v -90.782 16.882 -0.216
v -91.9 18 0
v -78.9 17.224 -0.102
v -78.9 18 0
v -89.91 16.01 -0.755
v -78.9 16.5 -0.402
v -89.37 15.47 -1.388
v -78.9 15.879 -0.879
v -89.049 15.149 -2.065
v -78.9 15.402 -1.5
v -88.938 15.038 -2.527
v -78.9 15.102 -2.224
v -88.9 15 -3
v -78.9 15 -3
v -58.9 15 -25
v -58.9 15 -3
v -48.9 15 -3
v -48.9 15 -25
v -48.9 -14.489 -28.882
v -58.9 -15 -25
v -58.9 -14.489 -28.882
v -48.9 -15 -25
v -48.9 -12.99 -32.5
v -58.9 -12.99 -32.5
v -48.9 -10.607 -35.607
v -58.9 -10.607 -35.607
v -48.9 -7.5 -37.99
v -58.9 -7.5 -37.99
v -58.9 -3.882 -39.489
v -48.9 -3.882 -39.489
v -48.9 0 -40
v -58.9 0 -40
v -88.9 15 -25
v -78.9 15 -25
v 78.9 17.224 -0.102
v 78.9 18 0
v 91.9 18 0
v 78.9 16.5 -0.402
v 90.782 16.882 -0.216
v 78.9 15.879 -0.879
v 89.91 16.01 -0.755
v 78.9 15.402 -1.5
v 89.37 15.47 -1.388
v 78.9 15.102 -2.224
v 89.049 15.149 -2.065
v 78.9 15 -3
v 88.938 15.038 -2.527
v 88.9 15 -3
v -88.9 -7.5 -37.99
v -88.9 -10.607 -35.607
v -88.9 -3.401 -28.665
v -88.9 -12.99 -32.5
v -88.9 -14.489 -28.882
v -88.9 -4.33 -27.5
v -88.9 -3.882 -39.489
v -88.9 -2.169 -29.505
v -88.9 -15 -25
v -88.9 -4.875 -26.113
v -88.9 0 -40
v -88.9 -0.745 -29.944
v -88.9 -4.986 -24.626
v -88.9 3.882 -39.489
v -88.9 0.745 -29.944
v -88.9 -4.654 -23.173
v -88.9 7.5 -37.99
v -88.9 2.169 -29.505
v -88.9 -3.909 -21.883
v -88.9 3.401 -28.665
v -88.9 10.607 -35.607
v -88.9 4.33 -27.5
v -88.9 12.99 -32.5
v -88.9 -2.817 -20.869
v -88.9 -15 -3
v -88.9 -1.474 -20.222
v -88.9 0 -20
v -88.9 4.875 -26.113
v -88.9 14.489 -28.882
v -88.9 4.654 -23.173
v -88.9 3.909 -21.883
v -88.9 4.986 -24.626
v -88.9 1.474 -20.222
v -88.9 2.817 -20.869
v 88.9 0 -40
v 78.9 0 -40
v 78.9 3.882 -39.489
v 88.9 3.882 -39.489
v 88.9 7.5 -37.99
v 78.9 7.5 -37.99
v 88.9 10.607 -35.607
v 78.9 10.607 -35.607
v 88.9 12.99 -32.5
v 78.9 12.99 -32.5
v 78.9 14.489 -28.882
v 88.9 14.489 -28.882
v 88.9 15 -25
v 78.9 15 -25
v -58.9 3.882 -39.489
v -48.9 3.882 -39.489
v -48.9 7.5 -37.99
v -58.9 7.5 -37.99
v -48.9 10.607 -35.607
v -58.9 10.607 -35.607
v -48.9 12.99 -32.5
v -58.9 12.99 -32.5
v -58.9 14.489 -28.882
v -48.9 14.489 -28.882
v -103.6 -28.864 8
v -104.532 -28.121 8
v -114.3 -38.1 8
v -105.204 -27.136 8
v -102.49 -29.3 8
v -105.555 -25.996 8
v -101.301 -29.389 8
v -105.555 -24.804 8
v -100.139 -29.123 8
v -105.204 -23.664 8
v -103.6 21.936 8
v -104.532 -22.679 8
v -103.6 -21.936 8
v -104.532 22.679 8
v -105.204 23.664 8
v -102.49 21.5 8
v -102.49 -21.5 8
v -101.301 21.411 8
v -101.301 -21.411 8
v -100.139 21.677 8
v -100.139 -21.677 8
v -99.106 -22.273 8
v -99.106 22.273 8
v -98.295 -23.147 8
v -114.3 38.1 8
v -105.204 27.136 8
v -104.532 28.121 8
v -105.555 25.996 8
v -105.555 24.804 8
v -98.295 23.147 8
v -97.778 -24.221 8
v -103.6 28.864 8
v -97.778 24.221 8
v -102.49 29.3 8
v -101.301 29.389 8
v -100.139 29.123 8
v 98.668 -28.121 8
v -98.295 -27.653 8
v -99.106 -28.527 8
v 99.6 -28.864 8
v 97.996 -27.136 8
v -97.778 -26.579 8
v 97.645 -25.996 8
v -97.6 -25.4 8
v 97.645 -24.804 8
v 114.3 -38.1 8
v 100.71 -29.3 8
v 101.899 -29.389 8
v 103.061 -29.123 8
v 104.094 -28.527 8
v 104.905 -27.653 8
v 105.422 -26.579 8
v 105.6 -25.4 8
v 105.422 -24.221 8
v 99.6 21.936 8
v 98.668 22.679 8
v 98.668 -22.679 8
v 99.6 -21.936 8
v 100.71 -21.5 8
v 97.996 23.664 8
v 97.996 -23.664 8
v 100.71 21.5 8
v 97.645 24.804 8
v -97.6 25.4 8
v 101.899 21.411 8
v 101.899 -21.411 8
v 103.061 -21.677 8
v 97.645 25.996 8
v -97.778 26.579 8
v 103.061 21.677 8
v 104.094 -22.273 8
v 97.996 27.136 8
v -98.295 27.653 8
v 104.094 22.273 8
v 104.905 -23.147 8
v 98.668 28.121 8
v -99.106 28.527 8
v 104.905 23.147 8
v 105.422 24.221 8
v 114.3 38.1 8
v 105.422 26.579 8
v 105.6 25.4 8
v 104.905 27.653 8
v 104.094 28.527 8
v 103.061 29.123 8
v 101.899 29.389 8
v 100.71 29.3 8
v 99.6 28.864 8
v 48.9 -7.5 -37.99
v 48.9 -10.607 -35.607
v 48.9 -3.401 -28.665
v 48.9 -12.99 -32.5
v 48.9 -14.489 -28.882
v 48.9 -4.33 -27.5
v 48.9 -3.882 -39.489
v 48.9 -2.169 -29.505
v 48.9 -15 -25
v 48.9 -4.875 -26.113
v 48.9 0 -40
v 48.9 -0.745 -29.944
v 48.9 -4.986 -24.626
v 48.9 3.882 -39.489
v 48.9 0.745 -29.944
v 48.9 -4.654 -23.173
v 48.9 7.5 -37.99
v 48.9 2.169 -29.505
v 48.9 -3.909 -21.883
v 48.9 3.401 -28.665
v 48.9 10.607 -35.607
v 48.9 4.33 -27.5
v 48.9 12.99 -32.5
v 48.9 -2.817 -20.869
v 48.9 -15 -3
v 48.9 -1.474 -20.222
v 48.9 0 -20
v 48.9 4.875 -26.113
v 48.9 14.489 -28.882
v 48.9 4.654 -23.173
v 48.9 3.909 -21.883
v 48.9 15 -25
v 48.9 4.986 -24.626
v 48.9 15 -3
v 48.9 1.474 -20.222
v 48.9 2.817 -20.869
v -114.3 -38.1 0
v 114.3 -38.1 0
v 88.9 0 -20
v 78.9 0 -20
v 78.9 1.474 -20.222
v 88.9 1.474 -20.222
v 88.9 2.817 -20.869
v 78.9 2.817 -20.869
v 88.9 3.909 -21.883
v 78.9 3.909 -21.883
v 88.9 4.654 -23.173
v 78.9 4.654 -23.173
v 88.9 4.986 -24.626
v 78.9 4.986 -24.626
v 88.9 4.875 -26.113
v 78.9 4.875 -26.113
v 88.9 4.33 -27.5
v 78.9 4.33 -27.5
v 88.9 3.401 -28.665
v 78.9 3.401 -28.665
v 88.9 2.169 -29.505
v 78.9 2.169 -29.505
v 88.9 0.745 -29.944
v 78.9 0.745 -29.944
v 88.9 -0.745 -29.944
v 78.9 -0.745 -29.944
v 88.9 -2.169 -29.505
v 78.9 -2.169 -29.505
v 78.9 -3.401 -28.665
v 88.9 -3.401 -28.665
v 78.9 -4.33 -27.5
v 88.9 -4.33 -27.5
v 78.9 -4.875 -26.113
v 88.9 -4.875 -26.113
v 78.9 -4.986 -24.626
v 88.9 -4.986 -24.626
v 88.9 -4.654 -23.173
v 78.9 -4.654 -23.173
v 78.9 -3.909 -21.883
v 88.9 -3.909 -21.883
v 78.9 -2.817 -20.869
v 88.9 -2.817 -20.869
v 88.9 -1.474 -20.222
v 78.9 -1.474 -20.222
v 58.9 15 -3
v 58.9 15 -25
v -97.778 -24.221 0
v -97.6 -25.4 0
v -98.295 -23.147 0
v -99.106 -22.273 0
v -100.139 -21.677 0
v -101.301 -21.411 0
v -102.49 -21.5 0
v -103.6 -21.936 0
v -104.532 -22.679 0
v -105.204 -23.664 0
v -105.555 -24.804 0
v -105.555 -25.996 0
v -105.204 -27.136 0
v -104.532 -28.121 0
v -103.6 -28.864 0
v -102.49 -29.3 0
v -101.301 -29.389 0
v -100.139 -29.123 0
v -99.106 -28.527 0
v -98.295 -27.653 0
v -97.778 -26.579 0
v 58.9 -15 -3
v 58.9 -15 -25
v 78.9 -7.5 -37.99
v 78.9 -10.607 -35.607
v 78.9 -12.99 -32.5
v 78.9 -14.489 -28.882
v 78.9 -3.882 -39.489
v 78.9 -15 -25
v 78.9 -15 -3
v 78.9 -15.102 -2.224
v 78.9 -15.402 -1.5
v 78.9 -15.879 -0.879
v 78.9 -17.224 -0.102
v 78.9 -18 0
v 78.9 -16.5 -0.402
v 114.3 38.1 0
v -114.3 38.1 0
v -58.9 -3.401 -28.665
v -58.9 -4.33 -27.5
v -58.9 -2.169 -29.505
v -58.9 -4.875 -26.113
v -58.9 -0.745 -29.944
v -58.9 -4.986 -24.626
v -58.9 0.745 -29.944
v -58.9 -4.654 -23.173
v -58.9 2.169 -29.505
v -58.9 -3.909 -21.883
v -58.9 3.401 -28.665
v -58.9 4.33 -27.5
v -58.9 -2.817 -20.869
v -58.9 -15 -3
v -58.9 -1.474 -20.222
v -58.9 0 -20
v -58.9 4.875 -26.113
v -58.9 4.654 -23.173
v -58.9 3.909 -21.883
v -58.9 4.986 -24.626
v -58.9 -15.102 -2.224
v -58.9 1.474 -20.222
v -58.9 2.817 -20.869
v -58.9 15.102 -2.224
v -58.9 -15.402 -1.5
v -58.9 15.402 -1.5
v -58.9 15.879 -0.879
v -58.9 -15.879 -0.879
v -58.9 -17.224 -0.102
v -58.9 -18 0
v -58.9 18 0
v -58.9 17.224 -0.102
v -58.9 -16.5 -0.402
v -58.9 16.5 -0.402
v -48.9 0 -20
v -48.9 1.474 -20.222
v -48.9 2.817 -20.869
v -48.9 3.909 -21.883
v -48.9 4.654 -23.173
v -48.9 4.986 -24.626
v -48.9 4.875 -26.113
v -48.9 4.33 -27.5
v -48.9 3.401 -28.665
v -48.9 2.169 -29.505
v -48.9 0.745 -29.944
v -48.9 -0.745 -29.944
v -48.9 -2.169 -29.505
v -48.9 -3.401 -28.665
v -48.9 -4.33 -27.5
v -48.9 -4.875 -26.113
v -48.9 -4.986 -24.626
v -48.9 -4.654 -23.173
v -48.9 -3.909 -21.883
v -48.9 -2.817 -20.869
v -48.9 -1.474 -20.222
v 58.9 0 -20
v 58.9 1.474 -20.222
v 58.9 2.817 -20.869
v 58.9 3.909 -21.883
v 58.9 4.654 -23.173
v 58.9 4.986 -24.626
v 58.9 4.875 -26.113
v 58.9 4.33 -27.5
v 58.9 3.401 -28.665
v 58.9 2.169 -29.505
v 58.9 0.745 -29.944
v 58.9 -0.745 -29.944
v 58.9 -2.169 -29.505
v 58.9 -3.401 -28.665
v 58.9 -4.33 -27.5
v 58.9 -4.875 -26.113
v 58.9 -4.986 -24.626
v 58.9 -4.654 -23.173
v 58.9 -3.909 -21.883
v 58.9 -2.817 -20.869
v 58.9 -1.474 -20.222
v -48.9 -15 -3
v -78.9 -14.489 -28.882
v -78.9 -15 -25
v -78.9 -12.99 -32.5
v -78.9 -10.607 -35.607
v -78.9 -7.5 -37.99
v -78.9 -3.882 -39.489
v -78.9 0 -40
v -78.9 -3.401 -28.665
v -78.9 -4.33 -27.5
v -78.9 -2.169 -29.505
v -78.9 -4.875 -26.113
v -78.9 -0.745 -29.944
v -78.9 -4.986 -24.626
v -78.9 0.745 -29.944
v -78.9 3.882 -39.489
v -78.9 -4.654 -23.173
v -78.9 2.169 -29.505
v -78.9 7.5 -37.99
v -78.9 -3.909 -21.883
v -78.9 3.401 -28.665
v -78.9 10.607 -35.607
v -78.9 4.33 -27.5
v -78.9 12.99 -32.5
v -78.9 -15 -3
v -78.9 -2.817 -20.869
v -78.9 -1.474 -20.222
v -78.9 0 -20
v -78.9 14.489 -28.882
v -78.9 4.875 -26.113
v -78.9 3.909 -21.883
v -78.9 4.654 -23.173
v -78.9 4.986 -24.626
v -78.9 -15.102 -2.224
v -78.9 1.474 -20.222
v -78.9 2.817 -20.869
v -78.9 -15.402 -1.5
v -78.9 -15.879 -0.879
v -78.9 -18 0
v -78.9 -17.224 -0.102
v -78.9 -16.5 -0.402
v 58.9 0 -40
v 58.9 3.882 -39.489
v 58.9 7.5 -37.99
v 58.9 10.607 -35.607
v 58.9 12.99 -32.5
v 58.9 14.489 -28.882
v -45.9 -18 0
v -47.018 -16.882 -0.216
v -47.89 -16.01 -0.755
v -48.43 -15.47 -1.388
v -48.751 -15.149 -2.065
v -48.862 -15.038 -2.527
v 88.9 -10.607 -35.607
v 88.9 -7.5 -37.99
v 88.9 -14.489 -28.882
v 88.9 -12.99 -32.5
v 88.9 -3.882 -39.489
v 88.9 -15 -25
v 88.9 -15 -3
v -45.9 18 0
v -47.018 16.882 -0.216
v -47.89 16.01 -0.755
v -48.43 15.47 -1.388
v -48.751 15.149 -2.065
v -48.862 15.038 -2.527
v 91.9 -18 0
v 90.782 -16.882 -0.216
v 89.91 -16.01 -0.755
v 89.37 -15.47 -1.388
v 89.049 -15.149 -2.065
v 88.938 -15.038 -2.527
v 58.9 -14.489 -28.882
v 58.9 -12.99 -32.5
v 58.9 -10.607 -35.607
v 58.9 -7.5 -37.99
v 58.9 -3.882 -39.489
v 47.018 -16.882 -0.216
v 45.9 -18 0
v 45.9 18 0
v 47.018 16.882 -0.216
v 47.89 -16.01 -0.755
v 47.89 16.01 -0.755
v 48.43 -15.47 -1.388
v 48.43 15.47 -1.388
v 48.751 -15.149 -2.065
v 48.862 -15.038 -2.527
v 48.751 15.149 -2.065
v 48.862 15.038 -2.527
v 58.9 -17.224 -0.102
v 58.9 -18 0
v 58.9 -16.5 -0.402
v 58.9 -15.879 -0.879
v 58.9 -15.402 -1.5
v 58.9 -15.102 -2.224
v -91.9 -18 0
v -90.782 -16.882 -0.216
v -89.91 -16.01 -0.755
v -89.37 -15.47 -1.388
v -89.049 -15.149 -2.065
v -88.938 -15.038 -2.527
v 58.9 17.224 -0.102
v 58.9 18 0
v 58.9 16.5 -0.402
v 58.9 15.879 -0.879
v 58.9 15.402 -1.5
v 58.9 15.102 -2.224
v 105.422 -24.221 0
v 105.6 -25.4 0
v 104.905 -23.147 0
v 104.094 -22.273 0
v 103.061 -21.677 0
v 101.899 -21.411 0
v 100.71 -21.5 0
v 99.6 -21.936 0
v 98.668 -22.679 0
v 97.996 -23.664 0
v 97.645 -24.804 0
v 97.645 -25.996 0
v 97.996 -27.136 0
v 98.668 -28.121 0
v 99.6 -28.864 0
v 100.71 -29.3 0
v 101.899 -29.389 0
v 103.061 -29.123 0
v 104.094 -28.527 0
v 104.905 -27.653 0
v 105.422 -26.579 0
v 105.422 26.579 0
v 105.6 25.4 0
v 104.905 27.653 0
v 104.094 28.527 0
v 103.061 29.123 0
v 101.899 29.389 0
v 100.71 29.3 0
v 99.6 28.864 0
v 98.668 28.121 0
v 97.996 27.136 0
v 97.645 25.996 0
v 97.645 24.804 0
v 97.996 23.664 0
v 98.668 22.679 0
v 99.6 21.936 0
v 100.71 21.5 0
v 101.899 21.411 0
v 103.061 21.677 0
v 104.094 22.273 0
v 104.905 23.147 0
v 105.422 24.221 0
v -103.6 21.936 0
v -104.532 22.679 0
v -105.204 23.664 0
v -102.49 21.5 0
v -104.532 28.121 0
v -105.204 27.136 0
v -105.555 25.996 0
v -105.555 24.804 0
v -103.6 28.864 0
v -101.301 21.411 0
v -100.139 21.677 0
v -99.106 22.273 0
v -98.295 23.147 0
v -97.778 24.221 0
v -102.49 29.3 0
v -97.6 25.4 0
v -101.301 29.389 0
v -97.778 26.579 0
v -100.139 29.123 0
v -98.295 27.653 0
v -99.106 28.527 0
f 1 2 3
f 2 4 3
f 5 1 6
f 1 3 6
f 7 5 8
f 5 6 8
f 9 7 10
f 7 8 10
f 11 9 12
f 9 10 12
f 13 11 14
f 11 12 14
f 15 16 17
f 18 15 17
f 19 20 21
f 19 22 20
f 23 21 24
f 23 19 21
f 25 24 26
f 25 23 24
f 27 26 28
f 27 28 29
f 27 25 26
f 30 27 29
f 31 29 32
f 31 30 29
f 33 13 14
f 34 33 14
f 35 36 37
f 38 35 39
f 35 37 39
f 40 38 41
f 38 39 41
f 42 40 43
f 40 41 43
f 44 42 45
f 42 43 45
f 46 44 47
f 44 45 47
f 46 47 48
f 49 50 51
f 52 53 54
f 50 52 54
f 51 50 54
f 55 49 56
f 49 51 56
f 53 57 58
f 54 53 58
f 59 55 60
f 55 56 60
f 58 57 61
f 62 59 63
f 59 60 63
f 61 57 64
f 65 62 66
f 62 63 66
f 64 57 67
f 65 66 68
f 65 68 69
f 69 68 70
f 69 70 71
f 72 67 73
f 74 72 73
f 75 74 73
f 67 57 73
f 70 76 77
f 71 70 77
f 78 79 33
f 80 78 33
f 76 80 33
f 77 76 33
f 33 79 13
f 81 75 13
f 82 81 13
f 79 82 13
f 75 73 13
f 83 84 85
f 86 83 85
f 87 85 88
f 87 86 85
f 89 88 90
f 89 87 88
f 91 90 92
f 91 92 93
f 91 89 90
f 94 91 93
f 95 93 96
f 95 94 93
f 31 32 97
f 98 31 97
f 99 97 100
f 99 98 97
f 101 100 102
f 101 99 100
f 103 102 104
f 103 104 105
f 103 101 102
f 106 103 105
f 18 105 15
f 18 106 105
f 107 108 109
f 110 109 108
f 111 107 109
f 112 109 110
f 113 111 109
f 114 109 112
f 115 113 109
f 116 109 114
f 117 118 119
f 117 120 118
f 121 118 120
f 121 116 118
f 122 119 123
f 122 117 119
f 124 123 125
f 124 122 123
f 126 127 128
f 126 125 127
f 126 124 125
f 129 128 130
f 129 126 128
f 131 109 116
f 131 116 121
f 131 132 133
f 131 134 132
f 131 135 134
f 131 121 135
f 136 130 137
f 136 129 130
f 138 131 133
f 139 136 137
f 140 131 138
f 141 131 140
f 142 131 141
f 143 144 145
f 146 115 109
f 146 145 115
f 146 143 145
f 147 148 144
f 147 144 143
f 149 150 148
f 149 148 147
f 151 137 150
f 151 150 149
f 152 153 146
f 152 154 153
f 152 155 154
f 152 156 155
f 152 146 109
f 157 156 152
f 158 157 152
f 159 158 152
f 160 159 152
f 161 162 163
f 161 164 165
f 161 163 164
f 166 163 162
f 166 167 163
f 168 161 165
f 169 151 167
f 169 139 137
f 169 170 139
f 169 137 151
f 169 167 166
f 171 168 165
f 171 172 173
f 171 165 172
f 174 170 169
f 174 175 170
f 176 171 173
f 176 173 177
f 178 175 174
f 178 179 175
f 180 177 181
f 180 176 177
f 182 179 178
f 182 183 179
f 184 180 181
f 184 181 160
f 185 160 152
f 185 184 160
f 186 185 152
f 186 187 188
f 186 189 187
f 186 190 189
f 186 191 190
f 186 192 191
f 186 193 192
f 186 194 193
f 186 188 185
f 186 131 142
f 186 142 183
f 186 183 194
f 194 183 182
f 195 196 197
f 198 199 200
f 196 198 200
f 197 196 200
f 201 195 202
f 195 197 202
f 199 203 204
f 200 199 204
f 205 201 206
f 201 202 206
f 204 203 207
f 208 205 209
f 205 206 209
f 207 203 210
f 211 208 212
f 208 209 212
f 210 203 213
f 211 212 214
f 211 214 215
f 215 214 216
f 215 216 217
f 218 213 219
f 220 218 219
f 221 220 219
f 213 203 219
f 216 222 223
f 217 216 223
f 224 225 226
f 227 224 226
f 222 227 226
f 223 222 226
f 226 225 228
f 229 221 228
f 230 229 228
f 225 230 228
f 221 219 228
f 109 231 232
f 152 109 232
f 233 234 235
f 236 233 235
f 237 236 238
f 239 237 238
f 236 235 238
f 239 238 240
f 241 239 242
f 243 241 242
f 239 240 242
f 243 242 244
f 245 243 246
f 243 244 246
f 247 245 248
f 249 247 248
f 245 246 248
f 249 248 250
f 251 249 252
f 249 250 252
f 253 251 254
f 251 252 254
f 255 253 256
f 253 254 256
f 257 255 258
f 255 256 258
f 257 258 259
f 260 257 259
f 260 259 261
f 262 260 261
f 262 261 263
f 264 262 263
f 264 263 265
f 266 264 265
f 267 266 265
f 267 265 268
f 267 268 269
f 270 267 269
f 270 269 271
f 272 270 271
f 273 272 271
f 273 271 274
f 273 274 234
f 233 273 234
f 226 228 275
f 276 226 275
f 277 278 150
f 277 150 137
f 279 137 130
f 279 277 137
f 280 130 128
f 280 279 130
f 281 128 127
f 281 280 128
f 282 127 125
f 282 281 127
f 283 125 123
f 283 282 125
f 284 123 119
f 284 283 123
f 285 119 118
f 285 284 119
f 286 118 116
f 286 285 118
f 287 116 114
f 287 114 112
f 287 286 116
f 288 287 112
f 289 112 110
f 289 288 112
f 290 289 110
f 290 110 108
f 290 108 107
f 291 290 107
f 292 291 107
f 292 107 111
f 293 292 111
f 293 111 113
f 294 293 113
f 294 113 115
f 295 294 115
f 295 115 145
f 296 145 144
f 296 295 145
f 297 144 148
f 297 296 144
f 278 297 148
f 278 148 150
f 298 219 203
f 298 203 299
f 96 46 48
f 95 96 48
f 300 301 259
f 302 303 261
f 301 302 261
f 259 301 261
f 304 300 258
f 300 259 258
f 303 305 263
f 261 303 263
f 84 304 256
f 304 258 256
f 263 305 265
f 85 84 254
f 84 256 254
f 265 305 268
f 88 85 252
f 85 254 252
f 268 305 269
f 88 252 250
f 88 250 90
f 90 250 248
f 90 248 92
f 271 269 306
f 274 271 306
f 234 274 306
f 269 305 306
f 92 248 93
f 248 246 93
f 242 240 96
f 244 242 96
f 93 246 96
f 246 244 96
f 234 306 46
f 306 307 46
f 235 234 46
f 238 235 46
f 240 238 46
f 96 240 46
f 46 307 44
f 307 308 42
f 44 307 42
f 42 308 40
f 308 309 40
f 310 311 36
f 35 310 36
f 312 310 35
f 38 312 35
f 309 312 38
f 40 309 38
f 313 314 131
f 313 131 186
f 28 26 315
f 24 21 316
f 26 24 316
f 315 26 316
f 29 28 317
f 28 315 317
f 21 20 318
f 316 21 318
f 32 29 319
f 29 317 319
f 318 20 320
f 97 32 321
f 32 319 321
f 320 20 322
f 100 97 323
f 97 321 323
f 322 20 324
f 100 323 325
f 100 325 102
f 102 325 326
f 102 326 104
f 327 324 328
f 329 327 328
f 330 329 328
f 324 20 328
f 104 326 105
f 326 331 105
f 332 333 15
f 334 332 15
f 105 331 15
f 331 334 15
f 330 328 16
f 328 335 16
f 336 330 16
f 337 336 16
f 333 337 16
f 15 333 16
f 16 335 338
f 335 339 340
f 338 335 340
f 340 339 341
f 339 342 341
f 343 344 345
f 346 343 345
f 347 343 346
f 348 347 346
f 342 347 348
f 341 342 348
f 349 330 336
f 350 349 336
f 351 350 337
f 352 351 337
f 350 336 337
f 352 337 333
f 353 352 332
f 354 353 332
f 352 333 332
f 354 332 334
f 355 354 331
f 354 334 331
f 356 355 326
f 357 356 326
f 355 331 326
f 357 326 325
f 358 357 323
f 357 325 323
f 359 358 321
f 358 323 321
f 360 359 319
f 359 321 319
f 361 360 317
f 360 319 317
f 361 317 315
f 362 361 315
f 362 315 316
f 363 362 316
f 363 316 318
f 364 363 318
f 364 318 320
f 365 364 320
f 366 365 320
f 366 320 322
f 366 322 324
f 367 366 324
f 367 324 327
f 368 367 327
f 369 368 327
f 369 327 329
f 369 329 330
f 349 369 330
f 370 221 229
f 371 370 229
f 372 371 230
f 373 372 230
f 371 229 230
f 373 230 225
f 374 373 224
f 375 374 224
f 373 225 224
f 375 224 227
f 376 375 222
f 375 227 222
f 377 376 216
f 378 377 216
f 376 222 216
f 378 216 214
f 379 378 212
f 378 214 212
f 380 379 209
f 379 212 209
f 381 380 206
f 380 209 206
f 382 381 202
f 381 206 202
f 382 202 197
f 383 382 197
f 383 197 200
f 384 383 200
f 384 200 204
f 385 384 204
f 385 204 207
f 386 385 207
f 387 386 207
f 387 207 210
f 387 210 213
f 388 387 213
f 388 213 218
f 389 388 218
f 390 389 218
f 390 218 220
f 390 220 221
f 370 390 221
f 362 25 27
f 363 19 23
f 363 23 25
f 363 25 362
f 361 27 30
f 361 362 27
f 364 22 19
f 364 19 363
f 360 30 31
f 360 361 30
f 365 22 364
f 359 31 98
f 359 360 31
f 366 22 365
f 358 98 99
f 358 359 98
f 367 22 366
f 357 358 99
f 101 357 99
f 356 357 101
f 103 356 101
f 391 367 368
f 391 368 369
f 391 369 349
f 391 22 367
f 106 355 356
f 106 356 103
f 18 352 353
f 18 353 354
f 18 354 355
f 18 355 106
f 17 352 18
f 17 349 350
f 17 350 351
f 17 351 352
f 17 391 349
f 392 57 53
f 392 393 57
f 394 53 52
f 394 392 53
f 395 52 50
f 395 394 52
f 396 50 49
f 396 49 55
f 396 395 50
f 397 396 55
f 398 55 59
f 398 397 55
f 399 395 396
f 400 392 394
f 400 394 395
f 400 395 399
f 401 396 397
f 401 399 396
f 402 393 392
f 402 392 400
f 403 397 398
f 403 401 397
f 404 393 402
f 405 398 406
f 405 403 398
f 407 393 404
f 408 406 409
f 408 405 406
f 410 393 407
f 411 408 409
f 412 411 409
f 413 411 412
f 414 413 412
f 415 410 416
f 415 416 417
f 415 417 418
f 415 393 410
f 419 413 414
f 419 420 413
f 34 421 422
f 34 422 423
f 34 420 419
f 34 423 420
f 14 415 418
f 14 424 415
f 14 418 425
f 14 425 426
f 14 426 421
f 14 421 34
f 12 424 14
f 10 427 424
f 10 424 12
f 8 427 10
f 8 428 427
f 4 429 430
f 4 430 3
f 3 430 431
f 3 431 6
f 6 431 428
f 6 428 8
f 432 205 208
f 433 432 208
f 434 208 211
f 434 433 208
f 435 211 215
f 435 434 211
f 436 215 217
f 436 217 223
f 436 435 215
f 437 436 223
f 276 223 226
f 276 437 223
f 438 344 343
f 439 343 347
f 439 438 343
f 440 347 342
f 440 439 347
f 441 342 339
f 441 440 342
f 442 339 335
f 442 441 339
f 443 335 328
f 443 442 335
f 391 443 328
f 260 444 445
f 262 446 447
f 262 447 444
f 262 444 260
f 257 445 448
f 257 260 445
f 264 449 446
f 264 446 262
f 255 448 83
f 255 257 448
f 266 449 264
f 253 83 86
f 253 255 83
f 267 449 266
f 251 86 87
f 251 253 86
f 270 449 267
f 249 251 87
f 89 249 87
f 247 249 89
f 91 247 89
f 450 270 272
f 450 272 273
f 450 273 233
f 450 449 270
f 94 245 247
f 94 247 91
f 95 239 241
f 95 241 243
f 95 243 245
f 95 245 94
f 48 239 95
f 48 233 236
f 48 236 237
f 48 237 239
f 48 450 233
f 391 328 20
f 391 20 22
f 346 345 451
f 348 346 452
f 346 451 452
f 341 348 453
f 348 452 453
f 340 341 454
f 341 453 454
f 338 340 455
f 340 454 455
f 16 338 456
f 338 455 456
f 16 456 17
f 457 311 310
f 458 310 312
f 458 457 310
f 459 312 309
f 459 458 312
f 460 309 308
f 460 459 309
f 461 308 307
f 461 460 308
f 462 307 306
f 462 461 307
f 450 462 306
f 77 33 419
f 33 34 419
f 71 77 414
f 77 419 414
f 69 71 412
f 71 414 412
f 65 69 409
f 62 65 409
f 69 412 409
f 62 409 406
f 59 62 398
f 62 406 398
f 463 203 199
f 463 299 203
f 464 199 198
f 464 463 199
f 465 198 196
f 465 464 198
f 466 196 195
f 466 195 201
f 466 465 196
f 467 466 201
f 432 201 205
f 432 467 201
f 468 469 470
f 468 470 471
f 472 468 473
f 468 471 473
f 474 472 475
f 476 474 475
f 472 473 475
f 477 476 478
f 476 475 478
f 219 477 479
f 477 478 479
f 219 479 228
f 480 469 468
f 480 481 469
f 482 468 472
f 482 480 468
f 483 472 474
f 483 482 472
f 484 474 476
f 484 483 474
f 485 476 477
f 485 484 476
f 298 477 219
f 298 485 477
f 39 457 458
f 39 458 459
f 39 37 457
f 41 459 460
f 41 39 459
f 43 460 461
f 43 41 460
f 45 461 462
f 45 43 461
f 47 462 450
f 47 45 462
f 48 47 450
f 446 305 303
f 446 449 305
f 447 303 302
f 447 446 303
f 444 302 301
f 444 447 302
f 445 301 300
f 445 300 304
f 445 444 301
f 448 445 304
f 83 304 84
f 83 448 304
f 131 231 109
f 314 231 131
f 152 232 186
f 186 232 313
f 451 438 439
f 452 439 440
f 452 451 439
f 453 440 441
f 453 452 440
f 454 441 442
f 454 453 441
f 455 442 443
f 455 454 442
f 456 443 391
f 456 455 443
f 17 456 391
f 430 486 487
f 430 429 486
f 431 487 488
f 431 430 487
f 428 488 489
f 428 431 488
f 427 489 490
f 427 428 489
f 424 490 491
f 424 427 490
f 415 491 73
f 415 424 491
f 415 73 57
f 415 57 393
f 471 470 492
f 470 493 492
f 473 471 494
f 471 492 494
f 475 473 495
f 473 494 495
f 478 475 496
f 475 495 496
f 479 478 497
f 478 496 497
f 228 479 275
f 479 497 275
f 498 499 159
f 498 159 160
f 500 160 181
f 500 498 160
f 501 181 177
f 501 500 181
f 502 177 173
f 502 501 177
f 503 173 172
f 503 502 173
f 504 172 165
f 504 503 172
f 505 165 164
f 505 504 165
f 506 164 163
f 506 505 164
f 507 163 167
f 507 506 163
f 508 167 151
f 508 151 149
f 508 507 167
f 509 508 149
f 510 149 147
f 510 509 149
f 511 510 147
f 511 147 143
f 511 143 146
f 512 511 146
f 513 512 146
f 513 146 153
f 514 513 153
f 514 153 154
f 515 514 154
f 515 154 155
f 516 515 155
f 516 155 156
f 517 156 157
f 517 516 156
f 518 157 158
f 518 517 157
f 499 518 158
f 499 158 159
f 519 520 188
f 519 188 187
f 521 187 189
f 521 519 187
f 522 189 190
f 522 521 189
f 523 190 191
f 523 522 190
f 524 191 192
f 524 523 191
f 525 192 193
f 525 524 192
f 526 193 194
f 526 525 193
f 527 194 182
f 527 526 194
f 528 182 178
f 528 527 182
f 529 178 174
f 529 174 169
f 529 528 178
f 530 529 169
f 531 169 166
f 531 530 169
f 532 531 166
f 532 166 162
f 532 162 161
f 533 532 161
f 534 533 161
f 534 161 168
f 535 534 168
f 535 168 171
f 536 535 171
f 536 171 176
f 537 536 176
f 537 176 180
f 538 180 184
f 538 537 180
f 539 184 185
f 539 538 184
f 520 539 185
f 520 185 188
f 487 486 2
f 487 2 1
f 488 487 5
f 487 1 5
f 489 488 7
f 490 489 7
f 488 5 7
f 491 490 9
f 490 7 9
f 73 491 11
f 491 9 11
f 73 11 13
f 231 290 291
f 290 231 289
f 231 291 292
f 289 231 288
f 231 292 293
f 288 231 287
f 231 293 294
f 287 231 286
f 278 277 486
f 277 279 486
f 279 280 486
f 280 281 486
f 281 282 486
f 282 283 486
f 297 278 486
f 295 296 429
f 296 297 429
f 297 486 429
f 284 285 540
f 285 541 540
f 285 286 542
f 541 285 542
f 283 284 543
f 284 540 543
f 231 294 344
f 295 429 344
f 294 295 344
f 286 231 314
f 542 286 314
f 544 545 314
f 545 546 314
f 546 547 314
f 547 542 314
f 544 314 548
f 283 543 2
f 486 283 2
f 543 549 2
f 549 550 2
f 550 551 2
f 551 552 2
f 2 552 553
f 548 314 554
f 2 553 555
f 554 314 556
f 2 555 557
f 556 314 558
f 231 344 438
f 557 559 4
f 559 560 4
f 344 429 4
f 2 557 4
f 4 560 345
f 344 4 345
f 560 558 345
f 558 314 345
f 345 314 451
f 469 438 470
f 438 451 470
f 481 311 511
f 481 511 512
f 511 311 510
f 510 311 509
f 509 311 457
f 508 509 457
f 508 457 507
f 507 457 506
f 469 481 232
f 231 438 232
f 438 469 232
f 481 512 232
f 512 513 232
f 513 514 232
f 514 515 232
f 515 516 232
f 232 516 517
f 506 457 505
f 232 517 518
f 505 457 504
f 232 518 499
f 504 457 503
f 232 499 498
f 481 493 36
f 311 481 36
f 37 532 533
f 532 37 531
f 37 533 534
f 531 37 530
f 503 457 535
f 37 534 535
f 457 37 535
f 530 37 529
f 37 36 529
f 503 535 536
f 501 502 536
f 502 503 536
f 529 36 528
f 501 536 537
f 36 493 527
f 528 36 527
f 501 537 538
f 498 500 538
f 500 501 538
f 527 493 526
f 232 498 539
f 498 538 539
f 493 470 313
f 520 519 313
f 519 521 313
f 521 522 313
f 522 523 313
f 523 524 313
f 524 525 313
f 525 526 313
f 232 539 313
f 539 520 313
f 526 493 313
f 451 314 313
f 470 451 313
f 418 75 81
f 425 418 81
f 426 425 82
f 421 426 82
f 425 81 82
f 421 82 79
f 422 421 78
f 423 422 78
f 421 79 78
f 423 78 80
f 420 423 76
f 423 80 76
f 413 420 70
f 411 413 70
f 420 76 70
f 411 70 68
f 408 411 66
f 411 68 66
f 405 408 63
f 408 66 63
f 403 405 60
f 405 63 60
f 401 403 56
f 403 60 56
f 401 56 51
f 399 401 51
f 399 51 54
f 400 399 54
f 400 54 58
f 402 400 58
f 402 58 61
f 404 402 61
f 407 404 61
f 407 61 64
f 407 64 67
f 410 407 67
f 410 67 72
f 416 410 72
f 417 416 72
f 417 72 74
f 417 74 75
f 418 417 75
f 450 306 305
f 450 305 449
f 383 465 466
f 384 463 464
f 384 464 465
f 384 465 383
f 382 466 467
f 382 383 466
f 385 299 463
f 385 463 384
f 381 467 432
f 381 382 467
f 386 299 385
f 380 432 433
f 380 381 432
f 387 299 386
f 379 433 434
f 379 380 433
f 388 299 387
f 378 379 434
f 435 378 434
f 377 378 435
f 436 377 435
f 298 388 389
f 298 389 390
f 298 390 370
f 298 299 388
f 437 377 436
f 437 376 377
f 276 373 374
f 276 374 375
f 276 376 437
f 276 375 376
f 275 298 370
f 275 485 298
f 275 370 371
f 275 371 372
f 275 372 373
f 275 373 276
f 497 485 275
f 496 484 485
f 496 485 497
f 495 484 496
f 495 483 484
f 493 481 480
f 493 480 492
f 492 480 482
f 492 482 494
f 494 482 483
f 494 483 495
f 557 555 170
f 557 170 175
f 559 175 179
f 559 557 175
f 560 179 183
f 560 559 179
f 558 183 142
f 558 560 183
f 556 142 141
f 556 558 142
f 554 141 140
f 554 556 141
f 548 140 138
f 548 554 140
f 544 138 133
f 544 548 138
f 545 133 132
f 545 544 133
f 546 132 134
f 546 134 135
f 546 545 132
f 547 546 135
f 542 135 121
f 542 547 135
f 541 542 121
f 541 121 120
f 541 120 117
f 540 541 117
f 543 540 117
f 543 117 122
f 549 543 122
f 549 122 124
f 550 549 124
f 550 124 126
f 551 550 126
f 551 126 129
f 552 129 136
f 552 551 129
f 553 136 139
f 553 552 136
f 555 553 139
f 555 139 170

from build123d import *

# Parameters (mm, degrees)
SKETCH1_W           = 228.6
SKETCH1_H           = 76.2
SKETCH1_R           = 4
SKETCH1_W_2         = 10
SKETCH1_H_2         = 30
BOSS_EXTRUDE1_DEPTH = 8
SKETCH1_3_W         = 10
SKETCH1_3_H         = 30
BOSS_EXTRUDE2_DEPTH = 40
FILLET1_R           = 3
SKETCH2_R           = 5
CUT_EXTRUDE1_DEPTH  = 211.575046005
FILLET2_R           = 15


with BuildPart() as part:
    # Sketch1 → Boss-Extrude1 (new body)
    # profile 1 of 5: a face of its own
    with BuildSketch(Plane.XY):
        Rectangle(SKETCH1_W, SKETCH1_H)
        with Locations((-101.6, -25.4)):
            Circle(SKETCH1_R, mode=Mode.SUBTRACT)
        with Locations((101.6, -25.4)):
            Circle(SKETCH1_R, mode=Mode.SUBTRACT)
        with Locations((101.6, 25.4)):
            Circle(SKETCH1_R, mode=Mode.SUBTRACT)
        with Locations((-101.6, 25.4)):
            Circle(SKETCH1_R, mode=Mode.SUBTRACT)
        with Locations((53.9, 0)):
            Rectangle(SKETCH1_W_2, SKETCH1_H_2, mode=Mode.SUBTRACT)
        with Locations((83.9, 0)):
            Rectangle(SKETCH1_W_2, SKETCH1_H_2, mode=Mode.SUBTRACT)
        with Locations((-83.9, 0)):
            Rectangle(SKETCH1_W_2, SKETCH1_H_2, mode=Mode.SUBTRACT)
        with Locations((-53.9, 0)):
            Rectangle(SKETCH1_W_2, SKETCH1_H_2, mode=Mode.SUBTRACT)
    # profile 2 of 5: a face of its own
    with BuildSketch(Plane.XY):
        with Locations((-53.9, 0)):
            Rectangle(SKETCH1_W_2, SKETCH1_H_2)
    # profile 3 of 5: a face of its own
    with BuildSketch(Plane.XY):
        with Locations((-83.9, 0)):
            Rectangle(SKETCH1_W_2, SKETCH1_H_2)
    # profile 4 of 5: a face of its own
    with BuildSketch(Plane.XY):
        with Locations((53.9, 0)):
            Rectangle(SKETCH1_W_2, SKETCH1_H_2)
    # profile 5 of 5: a face of its own
    with BuildSketch(Plane.XY):
        with Locations((83.9, 0)):
            Rectangle(SKETCH1_W_2, SKETCH1_H_2)
    extrude(amount=BOSS_EXTRUDE1_DEPTH)

    # Sketch1<3> → Boss-Extrude2 (add)
    with BuildSketch(Plane.XY):
        with Locations((-83.9, 0)):
            Rectangle(SKETCH1_3_W, SKETCH1_3_H)
        with Locations((-53.9, 0)):
            Rectangle(SKETCH1_3_W, SKETCH1_3_H)
        with Locations((83.9, 0)):
            Rectangle(SKETCH1_3_W, SKETCH1_3_H)
        with Locations((53.9, 0)):
            Rectangle(SKETCH1_3_W, SKETCH1_3_H)
    extrude(amount=-BOSS_EXTRUDE2_DEPTH)

    # Fillet1
    fillet1_edges = [part.edges().sort_by_distance(p)[0] for p in [
        (-83.9, 15, 0),
        (-88.9, 0, 0),
        (-83.9, -15, 0),
        (-48.9, 0, 0),
        (-53.9, 15, 0),
        (-53.9, -15, 0),
        (88.9, 0, 0),
        (83.9, -15, 0),
        (83.9, 15, 0),
        (53.9, -15, 0),
        (53.9, 15, 0),
        (48.9, 0, 0),
    ]]
    fillet(fillet1_edges, radius=FILLET1_R)

    # Sketch2 → Cut-Extrude1 (cut, through all)
    with BuildSketch(Plane.ZY.offset(88.9)):
        with Locations((-25, 0)):
            Circle(SKETCH2_R)
    extrude(amount=-CUT_EXTRUDE1_DEPTH, mode=Mode.SUBTRACT)

    # Fillet2
    fillet2_edges = [part.edges().sort_by_distance(p)[0] for p in [
        (53.9, 15, -40),
        (53.9, -15, -40),
        (83.9, 15, -40),
        (83.9, -15, -40),
        (-53.9, 15, -40),
        (-53.9, -15, -40),
        (-83.9, -15, -40),
        (-83.9, 15, -40),
    ]]
    fillet(fillet2_edges, radius=FILLET2_R - 0.0001)  # a hair under: the kernel refuses the full size


solid = part.part
